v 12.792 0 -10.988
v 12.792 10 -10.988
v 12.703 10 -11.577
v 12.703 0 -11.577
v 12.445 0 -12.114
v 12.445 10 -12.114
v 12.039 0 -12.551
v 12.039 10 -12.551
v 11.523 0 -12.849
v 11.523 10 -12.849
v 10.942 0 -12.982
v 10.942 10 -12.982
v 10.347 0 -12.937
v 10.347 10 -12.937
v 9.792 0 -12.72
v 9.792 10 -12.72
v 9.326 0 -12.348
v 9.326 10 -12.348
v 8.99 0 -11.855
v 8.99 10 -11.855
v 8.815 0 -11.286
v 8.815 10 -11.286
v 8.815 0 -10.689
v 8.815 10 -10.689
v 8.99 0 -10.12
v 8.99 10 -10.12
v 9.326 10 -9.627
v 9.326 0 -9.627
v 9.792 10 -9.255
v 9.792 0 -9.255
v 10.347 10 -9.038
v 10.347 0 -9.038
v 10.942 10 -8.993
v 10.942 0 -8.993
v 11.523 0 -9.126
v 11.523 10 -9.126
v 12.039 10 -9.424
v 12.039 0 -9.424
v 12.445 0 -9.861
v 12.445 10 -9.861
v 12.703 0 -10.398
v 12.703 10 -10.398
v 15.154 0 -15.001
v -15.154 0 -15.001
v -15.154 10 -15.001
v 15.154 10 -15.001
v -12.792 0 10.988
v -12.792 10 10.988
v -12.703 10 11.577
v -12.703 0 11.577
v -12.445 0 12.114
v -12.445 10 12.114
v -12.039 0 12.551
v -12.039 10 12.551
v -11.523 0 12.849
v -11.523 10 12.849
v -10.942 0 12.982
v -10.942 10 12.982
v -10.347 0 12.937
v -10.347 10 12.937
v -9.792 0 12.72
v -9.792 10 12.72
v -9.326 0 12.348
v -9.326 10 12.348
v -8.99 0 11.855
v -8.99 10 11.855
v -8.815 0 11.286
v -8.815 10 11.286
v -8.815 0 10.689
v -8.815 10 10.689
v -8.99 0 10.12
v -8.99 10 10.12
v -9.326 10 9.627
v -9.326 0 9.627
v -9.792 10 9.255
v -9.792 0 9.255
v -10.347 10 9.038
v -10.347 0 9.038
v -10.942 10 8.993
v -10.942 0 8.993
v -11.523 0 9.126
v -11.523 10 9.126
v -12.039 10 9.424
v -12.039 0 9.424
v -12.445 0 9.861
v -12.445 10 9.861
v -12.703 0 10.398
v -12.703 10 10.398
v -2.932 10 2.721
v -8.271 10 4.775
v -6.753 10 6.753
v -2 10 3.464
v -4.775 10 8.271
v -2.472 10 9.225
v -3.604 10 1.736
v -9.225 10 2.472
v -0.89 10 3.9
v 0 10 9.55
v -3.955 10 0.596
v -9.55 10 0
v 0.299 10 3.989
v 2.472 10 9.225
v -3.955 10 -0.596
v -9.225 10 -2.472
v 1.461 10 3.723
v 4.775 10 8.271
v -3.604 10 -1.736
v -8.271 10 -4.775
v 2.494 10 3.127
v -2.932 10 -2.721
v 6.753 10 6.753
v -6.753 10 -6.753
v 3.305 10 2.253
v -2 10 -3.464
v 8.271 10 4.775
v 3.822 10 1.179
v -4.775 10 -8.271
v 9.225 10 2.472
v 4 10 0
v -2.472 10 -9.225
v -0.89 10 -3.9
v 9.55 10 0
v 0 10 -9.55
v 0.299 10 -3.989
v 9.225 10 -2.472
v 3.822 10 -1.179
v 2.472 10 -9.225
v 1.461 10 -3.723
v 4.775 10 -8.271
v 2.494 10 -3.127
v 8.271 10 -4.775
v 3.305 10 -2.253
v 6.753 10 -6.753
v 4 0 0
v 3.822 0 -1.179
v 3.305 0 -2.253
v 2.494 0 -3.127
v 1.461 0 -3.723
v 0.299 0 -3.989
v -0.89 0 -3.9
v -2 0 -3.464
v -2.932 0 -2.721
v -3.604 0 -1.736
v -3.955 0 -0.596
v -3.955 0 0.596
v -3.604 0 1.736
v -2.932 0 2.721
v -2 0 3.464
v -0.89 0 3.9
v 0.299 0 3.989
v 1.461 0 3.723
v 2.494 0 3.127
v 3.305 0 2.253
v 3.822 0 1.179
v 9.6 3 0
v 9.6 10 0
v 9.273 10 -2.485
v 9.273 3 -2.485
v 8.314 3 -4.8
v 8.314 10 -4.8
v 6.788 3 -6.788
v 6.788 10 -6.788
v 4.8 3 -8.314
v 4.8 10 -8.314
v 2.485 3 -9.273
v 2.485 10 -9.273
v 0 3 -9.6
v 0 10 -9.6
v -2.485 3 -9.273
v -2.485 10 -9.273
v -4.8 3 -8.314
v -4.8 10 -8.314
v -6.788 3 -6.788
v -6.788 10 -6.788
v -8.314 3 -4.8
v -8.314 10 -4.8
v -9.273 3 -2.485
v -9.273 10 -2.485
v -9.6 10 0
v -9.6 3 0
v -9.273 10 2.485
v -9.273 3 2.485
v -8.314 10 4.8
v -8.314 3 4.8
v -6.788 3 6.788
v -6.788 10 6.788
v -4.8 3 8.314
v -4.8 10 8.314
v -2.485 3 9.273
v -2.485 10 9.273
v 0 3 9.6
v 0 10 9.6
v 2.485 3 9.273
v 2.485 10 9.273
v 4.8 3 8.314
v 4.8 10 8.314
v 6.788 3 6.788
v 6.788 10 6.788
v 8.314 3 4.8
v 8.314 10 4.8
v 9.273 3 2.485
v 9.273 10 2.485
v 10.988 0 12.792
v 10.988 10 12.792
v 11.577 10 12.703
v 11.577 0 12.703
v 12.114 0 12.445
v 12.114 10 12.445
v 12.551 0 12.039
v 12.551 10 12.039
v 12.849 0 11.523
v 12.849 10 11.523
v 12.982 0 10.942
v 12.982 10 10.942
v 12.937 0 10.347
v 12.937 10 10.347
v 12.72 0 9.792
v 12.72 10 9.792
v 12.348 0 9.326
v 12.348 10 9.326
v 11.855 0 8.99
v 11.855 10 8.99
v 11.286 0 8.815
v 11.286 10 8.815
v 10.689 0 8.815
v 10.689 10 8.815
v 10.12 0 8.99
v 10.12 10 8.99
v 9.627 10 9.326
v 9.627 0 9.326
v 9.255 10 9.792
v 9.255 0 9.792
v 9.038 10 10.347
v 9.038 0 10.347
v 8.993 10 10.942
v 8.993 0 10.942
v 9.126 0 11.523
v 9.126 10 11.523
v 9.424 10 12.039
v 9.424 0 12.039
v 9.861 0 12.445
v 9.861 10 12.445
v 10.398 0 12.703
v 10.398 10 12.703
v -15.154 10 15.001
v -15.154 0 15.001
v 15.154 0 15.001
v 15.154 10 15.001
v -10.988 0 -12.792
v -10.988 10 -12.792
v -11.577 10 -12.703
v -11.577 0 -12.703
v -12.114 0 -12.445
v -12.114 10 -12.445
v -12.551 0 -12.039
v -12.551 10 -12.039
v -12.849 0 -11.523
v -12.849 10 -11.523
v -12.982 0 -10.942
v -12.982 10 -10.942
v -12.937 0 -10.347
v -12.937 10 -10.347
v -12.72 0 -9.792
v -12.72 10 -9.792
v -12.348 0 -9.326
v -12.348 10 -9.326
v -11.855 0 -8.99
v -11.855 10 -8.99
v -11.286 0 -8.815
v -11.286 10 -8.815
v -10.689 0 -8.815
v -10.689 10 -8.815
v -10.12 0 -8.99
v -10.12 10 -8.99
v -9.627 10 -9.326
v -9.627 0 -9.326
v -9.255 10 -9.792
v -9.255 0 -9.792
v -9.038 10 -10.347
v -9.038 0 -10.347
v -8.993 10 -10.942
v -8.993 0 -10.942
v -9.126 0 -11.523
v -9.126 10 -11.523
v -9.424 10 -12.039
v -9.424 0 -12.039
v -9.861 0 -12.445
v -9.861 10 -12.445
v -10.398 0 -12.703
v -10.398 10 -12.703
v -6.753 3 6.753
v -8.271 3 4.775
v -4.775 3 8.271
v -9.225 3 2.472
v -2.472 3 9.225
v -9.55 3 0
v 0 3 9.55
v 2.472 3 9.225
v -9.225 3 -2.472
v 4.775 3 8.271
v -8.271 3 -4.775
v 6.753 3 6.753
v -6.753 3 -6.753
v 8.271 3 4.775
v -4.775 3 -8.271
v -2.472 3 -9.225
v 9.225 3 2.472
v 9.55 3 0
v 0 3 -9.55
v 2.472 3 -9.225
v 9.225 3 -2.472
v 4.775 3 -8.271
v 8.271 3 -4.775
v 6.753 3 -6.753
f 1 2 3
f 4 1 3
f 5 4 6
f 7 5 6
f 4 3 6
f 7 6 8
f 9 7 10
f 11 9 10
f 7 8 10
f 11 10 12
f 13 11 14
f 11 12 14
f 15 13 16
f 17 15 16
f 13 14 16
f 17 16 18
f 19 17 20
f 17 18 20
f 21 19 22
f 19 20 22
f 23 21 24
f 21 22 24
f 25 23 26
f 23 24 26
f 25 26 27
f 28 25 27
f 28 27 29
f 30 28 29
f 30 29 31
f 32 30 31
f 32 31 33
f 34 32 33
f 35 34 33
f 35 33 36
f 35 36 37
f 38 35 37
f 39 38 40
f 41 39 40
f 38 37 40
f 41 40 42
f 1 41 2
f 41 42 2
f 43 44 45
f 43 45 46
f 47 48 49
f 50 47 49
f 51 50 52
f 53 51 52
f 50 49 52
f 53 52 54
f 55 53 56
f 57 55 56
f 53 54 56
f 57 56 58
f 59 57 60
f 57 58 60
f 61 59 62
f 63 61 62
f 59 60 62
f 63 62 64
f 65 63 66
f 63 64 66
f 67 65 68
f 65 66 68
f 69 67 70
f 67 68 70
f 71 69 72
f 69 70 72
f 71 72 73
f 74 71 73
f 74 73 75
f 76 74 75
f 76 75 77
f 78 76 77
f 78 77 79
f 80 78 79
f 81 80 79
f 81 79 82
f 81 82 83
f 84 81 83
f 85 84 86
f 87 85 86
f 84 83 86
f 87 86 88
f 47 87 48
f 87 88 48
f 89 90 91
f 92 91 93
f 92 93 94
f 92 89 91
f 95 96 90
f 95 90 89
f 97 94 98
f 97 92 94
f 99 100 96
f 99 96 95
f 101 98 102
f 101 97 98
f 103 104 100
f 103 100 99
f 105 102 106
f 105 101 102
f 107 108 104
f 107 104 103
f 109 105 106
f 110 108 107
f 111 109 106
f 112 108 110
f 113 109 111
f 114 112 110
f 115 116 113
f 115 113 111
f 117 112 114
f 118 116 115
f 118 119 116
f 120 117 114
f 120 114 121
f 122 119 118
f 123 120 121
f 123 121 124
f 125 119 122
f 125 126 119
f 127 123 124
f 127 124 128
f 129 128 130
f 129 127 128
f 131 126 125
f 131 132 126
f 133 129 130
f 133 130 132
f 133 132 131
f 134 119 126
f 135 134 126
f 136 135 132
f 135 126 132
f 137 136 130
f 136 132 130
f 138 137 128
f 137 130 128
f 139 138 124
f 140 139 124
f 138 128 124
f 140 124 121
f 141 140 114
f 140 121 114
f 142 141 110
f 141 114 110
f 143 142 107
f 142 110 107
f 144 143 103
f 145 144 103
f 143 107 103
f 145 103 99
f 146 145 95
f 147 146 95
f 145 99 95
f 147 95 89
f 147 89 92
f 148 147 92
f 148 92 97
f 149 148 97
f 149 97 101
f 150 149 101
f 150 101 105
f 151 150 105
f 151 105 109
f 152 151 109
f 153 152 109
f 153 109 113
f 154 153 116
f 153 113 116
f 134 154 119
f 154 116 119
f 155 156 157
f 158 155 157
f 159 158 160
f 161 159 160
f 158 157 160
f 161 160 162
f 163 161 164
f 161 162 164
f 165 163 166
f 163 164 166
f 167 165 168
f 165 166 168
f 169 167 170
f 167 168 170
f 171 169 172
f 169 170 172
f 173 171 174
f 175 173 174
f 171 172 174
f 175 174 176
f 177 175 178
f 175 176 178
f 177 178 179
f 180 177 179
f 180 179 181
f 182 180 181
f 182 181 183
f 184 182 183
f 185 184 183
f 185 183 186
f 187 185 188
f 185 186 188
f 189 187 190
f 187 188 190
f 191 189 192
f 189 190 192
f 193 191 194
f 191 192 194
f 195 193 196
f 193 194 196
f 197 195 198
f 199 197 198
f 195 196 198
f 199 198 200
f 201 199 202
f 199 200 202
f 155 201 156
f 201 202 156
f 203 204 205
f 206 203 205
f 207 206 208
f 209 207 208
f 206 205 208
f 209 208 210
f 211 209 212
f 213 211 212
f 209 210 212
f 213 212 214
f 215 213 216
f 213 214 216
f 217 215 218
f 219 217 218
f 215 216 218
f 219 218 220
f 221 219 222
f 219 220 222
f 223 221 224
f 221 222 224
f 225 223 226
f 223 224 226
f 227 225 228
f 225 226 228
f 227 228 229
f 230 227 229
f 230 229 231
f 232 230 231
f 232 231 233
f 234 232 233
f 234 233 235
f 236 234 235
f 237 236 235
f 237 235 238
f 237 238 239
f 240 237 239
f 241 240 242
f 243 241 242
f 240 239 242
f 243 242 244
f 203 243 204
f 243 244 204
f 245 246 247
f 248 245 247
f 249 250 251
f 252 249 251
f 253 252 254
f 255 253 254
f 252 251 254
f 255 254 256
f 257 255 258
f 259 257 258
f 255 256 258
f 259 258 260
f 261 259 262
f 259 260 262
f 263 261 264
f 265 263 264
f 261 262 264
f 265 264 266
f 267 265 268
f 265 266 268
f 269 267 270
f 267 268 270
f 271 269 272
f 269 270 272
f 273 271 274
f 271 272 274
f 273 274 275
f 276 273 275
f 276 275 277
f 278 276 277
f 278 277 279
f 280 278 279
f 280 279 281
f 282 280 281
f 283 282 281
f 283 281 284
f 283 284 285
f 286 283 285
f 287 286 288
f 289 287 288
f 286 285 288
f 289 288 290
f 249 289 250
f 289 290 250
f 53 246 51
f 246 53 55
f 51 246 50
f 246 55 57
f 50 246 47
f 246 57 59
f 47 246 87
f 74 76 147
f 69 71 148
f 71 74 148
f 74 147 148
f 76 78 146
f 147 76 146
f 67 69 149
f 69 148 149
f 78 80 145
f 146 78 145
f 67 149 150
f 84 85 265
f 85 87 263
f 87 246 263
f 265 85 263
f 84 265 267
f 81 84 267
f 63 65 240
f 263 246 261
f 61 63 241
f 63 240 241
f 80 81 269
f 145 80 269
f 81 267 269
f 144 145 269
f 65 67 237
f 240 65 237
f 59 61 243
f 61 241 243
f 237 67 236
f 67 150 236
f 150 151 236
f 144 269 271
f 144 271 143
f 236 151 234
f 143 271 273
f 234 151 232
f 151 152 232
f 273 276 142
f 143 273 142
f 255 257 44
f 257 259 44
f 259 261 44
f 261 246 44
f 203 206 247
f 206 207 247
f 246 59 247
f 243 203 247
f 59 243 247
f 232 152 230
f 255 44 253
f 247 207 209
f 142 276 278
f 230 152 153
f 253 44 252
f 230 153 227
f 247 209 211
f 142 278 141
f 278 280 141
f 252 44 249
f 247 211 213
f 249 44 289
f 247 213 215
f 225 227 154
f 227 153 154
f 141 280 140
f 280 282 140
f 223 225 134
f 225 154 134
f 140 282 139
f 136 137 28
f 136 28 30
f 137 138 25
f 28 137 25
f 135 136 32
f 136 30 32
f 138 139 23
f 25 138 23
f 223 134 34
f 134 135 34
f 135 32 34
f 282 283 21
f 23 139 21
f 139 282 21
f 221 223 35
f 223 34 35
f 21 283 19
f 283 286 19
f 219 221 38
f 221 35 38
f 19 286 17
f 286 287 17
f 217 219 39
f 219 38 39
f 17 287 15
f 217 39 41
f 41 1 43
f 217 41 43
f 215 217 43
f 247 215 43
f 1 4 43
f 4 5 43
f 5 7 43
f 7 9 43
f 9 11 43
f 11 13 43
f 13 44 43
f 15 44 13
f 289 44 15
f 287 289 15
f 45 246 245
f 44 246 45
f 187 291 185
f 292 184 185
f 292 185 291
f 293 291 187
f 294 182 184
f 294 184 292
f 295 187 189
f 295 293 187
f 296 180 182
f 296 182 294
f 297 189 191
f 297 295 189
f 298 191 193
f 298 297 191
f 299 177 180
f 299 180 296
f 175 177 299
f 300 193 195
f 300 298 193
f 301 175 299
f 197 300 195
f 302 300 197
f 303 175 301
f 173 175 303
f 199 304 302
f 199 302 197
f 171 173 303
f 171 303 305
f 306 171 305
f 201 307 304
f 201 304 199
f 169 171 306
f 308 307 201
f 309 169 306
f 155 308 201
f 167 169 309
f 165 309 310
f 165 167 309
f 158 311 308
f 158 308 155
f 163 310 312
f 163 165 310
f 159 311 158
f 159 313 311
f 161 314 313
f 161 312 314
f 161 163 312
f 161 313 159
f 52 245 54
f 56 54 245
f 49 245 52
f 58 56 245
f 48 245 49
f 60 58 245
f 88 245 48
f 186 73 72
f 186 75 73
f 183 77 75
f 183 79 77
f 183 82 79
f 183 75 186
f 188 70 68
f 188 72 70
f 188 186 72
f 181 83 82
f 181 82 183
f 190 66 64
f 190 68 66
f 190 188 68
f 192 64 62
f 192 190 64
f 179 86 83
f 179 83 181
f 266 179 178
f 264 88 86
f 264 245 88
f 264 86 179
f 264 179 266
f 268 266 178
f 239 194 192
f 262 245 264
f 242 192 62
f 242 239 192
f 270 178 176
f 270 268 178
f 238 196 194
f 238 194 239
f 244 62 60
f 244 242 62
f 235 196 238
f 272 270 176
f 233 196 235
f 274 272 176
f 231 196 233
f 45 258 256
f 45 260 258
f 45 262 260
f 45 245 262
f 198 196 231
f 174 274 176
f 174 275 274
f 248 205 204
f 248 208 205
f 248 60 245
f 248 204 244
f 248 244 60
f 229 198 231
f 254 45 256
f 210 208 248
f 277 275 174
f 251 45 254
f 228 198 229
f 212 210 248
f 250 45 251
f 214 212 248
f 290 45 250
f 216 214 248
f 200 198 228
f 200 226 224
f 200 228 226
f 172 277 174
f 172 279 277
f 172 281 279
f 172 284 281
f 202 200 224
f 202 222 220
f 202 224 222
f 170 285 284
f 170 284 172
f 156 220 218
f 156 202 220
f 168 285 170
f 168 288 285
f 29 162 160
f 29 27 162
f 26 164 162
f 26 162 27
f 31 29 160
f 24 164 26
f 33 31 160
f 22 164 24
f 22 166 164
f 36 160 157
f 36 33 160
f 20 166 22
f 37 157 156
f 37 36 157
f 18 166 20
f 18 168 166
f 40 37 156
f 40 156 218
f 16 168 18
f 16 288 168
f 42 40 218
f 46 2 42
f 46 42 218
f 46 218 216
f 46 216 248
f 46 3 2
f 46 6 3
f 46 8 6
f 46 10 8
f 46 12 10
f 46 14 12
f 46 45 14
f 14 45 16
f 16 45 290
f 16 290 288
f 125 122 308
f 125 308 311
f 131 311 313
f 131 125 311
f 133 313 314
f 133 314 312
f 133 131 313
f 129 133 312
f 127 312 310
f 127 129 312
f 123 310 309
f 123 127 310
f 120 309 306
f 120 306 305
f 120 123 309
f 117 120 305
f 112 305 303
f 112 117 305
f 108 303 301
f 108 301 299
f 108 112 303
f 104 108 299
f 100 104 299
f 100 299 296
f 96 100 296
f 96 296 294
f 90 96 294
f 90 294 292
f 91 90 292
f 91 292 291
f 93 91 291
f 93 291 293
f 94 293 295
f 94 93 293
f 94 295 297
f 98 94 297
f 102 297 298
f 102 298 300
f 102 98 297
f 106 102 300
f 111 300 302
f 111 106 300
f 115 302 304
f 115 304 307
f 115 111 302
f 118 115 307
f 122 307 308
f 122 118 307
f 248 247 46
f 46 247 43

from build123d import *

# Parameters (mm, degrees)
SKETCH1_W           = 30.30738701
SKETCH1_H           = 30.002560534
BOSS_EXTRUDE1_DEPTH = 10
SKETCH2_R           = 9.6
SKETCH2_R_2         = 9.55
CUT_EXTRUDE1_DEPTH  = 7
SKETCH3_R           = 4
CUT_EXTRUDE2_DEPTH  = 10
SKETCH4_R           = 2
CUT_EXTRUDE3_DEPTH  = 10
CIRPATTERN1_COUNT   = 4


with BuildPart() as part:
    # Sketch1 → Boss-Extrude1 (new body)
    with BuildSketch(Plane(origin=(0, 0, 0), x_dir=(1, 0, 0), z_dir=(0, 1, 0))):
        Rectangle(SKETCH1_W, SKETCH1_H)
    extrude(amount=BOSS_EXTRUDE1_DEPTH)

    # Sketch2 → Cut-Extrude1 (cut)
    with BuildSketch(Plane(origin=(0, 10, 0), x_dir=(1, 0, 0), z_dir=(0, 1, 0))):
        Circle(SKETCH2_R)
        Circle(SKETCH2_R_2, mode=Mode.SUBTRACT)
    extrude(amount=-CUT_EXTRUDE1_DEPTH, mode=Mode.SUBTRACT)

    # Sketch3 → Cut-Extrude2 (cut)
    with BuildSketch(Plane(origin=(0, 10, 0), x_dir=(1, 0, 0), z_dir=(0, 1, 0))):
        Circle(SKETCH3_R)
    extrude(amount=-CUT_EXTRUDE2_DEPTH, mode=Mode.SUBTRACT)

    # Sketch4 → Cut-Extrude3 (cut)
    with BuildSketch(Plane(origin=(0, 10, 0), x_dir=(1, 0, 0), z_dir=(0, 1, 0))):
        with Locations((10.792349727, 10.987509758)):
            Circle(SKETCH4_R)
    cut_extrude3 = extrude(amount=-CUT_EXTRUDE3_DEPTH, mode=Mode.SUBTRACT)

    # CirPattern1: Cut-Extrude3 ×4 about axis
    cirpattern1_axis = Axis((0, 0, 0), (0, 1, 0))
    for i in range(1, CIRPATTERN1_COUNT):
        add(cut_extrude3.rotate(cirpattern1_axis, i * 360 / CIRPATTERN1_COUNT), mode=Mode.SUBTRACT)


solid = part.part
